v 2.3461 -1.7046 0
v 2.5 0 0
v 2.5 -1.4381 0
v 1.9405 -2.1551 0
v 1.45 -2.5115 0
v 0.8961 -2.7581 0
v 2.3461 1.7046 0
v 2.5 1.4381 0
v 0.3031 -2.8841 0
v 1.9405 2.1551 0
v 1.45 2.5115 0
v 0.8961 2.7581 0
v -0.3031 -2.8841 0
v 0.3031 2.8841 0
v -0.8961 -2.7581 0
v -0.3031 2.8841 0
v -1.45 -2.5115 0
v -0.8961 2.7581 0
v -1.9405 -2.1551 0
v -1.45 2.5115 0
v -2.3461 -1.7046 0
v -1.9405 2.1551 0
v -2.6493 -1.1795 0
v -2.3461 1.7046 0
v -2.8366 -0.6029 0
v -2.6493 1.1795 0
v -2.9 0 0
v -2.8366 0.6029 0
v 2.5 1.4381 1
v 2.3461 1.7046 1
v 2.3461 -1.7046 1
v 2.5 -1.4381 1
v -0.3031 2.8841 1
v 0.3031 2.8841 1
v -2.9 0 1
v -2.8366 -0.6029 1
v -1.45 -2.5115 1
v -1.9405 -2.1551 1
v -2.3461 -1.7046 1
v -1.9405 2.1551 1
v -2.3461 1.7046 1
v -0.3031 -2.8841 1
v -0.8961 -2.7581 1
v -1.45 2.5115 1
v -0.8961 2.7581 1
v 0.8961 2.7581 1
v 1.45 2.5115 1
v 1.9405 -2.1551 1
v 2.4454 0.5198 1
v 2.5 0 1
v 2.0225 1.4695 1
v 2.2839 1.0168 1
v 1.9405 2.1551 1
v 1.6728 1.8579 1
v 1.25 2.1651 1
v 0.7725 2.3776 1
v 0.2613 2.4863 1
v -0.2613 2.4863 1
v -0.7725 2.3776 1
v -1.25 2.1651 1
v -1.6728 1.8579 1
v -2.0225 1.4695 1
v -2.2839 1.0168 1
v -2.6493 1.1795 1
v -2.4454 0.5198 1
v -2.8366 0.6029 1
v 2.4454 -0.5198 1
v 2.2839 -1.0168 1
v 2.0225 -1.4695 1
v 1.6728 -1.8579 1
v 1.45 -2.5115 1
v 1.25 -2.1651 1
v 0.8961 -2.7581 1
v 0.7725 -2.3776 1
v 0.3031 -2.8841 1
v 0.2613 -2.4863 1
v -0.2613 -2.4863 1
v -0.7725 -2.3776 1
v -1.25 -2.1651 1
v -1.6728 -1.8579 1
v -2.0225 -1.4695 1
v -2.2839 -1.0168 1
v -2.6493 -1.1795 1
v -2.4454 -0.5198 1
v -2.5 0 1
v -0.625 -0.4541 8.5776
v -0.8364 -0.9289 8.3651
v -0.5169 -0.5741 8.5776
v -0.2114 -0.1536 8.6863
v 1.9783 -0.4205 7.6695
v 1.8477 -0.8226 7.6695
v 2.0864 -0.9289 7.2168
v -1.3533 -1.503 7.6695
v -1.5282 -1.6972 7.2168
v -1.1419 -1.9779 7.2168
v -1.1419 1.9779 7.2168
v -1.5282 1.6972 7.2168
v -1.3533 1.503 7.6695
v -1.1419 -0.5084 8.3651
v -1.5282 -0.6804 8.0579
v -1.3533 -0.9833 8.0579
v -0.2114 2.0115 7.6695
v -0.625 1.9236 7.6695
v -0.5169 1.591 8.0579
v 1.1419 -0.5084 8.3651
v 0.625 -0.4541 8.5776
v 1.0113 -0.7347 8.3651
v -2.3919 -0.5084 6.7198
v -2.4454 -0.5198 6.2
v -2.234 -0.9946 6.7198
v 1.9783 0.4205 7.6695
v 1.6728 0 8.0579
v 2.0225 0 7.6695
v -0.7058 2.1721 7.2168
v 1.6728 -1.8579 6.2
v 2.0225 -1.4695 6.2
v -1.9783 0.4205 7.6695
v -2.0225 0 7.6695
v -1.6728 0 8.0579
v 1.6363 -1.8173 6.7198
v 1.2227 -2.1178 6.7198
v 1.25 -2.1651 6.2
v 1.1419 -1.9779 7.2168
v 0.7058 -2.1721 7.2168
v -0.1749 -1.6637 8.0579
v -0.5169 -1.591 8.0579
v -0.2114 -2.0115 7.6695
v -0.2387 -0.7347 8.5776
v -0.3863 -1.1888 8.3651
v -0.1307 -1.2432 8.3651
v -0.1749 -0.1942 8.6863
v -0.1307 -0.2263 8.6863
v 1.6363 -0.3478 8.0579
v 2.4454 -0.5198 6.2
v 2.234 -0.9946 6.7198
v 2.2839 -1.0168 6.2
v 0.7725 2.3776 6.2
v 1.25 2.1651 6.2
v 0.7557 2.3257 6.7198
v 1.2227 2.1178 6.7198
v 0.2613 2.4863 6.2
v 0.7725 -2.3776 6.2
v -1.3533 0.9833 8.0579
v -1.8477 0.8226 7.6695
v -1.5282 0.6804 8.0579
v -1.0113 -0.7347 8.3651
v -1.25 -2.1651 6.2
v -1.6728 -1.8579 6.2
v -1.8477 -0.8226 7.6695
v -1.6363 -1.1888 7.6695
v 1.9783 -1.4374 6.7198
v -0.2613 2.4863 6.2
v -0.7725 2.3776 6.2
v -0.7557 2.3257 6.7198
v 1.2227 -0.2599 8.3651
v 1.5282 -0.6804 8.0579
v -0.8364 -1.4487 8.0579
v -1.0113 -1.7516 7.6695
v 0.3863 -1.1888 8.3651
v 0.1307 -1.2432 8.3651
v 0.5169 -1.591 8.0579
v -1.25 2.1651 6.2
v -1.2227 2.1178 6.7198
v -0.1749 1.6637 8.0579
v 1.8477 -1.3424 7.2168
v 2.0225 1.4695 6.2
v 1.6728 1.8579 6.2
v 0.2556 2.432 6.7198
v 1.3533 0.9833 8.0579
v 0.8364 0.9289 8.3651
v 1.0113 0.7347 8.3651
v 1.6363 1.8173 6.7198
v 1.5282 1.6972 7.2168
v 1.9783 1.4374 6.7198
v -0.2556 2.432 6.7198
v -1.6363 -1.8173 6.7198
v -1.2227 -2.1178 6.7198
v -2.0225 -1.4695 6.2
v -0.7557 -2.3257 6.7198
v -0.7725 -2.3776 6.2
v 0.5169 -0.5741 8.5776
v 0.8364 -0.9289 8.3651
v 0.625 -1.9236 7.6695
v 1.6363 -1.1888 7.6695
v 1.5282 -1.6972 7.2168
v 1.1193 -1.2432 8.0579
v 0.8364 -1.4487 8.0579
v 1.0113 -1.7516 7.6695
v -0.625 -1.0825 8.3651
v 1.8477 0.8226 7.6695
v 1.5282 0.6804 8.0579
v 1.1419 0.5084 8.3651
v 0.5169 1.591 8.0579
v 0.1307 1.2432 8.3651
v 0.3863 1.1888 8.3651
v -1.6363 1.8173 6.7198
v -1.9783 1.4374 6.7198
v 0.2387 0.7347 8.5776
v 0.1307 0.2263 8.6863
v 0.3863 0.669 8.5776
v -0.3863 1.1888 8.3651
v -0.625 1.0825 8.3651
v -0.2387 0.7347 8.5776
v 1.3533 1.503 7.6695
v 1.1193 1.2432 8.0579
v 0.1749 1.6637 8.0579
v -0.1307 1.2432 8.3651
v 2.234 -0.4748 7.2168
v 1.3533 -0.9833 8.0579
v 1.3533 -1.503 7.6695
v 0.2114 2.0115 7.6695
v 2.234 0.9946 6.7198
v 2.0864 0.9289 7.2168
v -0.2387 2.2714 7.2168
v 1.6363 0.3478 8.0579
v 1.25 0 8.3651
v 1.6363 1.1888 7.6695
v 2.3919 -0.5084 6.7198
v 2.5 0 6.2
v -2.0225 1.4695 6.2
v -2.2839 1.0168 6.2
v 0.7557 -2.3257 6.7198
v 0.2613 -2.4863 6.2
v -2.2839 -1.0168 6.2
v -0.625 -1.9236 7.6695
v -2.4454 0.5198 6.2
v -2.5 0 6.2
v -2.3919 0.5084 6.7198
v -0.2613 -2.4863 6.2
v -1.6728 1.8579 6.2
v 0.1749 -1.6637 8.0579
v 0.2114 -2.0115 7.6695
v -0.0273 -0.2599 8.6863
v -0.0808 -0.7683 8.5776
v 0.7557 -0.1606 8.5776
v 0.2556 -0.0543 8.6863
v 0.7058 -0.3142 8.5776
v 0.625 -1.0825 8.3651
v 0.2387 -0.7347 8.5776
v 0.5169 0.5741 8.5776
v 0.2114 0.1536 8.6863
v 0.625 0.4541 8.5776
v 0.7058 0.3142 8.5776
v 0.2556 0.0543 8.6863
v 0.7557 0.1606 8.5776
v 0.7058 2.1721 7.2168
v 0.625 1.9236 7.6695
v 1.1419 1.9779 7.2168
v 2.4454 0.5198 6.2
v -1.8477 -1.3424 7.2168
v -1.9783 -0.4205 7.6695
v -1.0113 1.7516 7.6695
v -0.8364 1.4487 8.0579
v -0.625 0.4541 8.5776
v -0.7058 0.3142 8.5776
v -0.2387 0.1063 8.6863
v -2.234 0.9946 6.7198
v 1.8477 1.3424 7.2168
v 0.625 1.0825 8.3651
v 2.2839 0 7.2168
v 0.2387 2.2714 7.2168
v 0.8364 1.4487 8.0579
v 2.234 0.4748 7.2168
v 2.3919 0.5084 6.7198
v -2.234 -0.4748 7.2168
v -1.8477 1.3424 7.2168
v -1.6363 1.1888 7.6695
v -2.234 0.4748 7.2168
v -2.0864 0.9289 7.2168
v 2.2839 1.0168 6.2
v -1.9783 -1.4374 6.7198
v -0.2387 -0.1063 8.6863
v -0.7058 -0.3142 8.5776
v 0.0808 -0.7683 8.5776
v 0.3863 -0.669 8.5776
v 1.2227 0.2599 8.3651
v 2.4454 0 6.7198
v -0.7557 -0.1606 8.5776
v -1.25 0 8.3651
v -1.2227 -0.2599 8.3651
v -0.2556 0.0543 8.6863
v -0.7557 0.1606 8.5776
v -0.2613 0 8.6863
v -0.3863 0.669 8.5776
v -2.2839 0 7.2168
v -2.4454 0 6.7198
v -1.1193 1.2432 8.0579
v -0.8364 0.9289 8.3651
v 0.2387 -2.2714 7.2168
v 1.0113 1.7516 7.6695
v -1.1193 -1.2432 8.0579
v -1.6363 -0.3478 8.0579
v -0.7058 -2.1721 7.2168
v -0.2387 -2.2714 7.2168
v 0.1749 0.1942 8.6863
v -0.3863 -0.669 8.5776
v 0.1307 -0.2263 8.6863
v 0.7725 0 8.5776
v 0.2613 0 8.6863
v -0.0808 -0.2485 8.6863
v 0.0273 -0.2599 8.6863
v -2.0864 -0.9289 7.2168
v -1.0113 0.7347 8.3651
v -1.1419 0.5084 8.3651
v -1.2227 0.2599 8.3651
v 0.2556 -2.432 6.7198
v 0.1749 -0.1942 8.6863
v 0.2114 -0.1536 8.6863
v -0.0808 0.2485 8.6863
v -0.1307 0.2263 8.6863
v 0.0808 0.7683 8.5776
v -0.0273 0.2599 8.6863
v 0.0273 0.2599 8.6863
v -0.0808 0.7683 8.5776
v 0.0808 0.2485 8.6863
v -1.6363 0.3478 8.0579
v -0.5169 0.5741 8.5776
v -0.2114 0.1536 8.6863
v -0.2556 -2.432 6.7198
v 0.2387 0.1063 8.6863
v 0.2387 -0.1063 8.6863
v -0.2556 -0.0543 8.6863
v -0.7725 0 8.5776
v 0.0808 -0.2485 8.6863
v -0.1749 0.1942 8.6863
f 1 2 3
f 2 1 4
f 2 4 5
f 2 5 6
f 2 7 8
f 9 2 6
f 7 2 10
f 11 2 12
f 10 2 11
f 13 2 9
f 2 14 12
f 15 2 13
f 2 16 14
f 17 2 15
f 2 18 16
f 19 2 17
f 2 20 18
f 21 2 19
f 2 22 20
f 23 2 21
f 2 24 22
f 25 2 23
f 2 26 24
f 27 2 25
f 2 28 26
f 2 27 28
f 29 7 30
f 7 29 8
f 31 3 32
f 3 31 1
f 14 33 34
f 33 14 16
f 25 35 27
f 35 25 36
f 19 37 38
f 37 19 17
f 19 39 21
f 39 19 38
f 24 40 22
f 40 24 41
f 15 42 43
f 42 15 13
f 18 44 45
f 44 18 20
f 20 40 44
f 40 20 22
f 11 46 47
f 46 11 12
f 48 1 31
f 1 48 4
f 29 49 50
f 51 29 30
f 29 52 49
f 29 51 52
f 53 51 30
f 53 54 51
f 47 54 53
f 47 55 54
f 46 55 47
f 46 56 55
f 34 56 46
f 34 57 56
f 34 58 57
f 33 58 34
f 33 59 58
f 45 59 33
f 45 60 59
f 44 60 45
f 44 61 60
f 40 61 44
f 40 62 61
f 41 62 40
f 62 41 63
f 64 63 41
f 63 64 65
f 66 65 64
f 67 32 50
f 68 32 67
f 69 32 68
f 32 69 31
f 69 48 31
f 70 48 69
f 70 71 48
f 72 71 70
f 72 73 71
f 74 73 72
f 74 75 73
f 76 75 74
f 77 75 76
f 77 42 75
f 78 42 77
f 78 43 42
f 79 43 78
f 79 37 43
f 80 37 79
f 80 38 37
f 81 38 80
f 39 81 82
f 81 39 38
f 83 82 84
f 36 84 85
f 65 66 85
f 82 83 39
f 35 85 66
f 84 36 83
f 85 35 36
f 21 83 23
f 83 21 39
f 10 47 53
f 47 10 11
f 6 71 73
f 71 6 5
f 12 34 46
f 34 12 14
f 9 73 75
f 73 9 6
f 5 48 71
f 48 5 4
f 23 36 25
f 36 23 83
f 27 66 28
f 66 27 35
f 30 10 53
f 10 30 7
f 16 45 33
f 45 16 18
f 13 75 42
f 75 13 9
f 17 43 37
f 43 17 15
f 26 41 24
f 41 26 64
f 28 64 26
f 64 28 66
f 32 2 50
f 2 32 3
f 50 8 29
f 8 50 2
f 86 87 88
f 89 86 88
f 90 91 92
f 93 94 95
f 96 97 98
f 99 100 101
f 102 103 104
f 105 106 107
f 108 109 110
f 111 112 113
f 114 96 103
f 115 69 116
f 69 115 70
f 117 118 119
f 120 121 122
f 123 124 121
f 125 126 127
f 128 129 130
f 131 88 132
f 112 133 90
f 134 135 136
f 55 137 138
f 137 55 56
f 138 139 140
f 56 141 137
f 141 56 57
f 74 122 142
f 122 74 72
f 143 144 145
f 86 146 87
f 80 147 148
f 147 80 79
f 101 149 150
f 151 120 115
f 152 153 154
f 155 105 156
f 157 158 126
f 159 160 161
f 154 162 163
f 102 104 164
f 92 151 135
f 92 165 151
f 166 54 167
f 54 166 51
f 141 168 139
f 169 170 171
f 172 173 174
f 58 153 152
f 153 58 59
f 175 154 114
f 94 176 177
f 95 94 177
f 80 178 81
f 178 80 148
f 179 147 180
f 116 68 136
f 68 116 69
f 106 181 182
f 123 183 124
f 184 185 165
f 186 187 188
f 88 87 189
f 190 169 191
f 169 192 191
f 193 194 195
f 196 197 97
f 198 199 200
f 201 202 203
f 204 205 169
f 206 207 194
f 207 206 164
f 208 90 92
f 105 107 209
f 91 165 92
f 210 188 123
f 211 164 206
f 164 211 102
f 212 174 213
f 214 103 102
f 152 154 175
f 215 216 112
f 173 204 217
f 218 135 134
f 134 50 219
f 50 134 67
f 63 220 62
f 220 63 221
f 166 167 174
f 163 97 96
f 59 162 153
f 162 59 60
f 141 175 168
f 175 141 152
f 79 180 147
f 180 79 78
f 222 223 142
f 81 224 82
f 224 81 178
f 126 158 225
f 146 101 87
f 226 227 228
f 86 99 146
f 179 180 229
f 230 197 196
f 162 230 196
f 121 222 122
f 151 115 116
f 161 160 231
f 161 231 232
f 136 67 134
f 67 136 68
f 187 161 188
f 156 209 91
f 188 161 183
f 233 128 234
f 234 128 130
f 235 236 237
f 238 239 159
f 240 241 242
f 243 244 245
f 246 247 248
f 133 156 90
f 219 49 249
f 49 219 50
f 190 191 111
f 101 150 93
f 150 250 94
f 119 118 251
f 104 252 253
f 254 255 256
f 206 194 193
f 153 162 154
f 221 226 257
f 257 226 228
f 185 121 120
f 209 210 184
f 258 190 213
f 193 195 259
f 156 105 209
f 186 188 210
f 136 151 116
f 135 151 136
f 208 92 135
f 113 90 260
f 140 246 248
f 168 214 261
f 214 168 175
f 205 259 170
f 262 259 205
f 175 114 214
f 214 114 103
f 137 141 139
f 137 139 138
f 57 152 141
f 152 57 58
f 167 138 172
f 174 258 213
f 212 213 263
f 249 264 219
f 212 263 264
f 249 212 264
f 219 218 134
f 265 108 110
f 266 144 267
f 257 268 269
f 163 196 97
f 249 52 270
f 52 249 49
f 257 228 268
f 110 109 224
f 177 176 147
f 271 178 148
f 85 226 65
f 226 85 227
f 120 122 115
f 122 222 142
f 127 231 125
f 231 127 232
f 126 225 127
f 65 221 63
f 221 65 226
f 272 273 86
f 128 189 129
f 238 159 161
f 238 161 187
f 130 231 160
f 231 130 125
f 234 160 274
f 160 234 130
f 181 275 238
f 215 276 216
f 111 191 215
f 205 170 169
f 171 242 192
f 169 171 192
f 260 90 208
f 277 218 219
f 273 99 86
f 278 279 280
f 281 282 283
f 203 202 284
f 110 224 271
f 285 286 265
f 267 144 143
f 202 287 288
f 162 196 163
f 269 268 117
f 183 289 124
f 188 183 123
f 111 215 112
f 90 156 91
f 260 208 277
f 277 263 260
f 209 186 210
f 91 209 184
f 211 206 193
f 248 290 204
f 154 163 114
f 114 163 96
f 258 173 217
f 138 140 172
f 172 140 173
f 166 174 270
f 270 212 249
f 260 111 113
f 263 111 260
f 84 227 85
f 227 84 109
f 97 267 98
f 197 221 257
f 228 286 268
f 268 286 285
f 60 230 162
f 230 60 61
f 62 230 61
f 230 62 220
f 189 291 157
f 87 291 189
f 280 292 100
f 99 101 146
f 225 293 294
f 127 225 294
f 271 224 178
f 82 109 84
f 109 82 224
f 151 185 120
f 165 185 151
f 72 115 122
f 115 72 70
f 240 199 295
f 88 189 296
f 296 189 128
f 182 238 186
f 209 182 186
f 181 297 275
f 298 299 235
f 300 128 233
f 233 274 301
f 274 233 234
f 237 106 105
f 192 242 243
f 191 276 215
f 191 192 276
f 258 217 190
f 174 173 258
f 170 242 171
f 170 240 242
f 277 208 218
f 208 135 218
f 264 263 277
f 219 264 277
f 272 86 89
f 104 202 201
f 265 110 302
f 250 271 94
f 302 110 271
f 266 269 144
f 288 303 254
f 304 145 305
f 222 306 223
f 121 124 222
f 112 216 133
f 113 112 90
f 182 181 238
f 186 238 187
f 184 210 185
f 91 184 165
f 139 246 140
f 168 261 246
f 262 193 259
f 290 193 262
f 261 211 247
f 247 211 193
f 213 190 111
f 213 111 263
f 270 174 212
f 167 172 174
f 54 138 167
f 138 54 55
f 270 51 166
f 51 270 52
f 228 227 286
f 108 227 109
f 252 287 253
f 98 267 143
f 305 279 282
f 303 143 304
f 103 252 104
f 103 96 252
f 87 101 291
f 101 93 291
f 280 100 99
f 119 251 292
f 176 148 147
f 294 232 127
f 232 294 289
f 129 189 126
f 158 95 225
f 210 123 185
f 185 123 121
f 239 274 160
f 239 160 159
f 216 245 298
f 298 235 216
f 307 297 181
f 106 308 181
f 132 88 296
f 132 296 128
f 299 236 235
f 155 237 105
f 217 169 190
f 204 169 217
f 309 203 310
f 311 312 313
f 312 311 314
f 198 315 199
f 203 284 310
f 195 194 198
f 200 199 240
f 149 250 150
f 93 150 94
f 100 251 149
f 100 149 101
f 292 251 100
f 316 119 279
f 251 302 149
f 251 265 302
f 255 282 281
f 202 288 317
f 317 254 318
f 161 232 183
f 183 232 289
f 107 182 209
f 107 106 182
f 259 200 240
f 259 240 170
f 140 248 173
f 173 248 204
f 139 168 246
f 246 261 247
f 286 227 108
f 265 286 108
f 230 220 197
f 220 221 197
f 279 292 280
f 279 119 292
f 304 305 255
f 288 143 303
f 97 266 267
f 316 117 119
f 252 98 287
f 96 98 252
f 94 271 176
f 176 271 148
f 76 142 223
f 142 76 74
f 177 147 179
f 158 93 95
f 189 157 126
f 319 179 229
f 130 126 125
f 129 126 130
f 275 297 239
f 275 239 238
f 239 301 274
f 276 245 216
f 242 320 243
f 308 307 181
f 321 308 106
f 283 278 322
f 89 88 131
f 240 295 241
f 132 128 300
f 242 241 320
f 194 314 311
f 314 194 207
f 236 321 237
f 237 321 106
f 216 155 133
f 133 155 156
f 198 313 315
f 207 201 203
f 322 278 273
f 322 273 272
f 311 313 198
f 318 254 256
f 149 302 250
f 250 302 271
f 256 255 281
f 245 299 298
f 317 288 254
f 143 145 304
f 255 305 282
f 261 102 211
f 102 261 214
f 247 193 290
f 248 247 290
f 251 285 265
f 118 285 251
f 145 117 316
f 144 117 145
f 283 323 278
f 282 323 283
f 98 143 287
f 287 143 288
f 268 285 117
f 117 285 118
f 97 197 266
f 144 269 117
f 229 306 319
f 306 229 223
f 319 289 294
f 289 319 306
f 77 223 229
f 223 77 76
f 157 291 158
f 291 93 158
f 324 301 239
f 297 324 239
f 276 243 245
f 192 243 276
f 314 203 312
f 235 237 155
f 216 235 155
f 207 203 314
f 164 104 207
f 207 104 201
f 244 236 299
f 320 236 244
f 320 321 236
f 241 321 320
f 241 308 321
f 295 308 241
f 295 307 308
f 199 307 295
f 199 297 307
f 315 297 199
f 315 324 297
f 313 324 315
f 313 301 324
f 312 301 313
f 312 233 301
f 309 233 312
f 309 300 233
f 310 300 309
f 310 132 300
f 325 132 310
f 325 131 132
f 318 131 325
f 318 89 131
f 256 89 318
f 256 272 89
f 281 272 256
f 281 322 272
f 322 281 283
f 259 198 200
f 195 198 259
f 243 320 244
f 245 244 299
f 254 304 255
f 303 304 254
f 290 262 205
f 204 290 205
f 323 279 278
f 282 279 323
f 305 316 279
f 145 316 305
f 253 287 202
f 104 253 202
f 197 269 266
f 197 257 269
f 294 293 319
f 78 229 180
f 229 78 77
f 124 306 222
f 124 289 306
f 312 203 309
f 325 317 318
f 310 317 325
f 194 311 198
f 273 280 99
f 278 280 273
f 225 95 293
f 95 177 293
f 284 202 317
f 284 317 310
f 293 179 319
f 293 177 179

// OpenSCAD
module OS5RKA5111A(){
    $fs=0.01;

    color("red")
    hull(){
        translate([0,0,8.7-2.5])sphere(2.5);
        cylinder(h=8.7-2.5,r=2.5);
    }
    color("red")
    difference(){
        cylinder(h=1, r=(5.8/2));
        translate([2.5, -5,-2])cube([10,10,10]);
    }

}
OS5RKA5111A();
